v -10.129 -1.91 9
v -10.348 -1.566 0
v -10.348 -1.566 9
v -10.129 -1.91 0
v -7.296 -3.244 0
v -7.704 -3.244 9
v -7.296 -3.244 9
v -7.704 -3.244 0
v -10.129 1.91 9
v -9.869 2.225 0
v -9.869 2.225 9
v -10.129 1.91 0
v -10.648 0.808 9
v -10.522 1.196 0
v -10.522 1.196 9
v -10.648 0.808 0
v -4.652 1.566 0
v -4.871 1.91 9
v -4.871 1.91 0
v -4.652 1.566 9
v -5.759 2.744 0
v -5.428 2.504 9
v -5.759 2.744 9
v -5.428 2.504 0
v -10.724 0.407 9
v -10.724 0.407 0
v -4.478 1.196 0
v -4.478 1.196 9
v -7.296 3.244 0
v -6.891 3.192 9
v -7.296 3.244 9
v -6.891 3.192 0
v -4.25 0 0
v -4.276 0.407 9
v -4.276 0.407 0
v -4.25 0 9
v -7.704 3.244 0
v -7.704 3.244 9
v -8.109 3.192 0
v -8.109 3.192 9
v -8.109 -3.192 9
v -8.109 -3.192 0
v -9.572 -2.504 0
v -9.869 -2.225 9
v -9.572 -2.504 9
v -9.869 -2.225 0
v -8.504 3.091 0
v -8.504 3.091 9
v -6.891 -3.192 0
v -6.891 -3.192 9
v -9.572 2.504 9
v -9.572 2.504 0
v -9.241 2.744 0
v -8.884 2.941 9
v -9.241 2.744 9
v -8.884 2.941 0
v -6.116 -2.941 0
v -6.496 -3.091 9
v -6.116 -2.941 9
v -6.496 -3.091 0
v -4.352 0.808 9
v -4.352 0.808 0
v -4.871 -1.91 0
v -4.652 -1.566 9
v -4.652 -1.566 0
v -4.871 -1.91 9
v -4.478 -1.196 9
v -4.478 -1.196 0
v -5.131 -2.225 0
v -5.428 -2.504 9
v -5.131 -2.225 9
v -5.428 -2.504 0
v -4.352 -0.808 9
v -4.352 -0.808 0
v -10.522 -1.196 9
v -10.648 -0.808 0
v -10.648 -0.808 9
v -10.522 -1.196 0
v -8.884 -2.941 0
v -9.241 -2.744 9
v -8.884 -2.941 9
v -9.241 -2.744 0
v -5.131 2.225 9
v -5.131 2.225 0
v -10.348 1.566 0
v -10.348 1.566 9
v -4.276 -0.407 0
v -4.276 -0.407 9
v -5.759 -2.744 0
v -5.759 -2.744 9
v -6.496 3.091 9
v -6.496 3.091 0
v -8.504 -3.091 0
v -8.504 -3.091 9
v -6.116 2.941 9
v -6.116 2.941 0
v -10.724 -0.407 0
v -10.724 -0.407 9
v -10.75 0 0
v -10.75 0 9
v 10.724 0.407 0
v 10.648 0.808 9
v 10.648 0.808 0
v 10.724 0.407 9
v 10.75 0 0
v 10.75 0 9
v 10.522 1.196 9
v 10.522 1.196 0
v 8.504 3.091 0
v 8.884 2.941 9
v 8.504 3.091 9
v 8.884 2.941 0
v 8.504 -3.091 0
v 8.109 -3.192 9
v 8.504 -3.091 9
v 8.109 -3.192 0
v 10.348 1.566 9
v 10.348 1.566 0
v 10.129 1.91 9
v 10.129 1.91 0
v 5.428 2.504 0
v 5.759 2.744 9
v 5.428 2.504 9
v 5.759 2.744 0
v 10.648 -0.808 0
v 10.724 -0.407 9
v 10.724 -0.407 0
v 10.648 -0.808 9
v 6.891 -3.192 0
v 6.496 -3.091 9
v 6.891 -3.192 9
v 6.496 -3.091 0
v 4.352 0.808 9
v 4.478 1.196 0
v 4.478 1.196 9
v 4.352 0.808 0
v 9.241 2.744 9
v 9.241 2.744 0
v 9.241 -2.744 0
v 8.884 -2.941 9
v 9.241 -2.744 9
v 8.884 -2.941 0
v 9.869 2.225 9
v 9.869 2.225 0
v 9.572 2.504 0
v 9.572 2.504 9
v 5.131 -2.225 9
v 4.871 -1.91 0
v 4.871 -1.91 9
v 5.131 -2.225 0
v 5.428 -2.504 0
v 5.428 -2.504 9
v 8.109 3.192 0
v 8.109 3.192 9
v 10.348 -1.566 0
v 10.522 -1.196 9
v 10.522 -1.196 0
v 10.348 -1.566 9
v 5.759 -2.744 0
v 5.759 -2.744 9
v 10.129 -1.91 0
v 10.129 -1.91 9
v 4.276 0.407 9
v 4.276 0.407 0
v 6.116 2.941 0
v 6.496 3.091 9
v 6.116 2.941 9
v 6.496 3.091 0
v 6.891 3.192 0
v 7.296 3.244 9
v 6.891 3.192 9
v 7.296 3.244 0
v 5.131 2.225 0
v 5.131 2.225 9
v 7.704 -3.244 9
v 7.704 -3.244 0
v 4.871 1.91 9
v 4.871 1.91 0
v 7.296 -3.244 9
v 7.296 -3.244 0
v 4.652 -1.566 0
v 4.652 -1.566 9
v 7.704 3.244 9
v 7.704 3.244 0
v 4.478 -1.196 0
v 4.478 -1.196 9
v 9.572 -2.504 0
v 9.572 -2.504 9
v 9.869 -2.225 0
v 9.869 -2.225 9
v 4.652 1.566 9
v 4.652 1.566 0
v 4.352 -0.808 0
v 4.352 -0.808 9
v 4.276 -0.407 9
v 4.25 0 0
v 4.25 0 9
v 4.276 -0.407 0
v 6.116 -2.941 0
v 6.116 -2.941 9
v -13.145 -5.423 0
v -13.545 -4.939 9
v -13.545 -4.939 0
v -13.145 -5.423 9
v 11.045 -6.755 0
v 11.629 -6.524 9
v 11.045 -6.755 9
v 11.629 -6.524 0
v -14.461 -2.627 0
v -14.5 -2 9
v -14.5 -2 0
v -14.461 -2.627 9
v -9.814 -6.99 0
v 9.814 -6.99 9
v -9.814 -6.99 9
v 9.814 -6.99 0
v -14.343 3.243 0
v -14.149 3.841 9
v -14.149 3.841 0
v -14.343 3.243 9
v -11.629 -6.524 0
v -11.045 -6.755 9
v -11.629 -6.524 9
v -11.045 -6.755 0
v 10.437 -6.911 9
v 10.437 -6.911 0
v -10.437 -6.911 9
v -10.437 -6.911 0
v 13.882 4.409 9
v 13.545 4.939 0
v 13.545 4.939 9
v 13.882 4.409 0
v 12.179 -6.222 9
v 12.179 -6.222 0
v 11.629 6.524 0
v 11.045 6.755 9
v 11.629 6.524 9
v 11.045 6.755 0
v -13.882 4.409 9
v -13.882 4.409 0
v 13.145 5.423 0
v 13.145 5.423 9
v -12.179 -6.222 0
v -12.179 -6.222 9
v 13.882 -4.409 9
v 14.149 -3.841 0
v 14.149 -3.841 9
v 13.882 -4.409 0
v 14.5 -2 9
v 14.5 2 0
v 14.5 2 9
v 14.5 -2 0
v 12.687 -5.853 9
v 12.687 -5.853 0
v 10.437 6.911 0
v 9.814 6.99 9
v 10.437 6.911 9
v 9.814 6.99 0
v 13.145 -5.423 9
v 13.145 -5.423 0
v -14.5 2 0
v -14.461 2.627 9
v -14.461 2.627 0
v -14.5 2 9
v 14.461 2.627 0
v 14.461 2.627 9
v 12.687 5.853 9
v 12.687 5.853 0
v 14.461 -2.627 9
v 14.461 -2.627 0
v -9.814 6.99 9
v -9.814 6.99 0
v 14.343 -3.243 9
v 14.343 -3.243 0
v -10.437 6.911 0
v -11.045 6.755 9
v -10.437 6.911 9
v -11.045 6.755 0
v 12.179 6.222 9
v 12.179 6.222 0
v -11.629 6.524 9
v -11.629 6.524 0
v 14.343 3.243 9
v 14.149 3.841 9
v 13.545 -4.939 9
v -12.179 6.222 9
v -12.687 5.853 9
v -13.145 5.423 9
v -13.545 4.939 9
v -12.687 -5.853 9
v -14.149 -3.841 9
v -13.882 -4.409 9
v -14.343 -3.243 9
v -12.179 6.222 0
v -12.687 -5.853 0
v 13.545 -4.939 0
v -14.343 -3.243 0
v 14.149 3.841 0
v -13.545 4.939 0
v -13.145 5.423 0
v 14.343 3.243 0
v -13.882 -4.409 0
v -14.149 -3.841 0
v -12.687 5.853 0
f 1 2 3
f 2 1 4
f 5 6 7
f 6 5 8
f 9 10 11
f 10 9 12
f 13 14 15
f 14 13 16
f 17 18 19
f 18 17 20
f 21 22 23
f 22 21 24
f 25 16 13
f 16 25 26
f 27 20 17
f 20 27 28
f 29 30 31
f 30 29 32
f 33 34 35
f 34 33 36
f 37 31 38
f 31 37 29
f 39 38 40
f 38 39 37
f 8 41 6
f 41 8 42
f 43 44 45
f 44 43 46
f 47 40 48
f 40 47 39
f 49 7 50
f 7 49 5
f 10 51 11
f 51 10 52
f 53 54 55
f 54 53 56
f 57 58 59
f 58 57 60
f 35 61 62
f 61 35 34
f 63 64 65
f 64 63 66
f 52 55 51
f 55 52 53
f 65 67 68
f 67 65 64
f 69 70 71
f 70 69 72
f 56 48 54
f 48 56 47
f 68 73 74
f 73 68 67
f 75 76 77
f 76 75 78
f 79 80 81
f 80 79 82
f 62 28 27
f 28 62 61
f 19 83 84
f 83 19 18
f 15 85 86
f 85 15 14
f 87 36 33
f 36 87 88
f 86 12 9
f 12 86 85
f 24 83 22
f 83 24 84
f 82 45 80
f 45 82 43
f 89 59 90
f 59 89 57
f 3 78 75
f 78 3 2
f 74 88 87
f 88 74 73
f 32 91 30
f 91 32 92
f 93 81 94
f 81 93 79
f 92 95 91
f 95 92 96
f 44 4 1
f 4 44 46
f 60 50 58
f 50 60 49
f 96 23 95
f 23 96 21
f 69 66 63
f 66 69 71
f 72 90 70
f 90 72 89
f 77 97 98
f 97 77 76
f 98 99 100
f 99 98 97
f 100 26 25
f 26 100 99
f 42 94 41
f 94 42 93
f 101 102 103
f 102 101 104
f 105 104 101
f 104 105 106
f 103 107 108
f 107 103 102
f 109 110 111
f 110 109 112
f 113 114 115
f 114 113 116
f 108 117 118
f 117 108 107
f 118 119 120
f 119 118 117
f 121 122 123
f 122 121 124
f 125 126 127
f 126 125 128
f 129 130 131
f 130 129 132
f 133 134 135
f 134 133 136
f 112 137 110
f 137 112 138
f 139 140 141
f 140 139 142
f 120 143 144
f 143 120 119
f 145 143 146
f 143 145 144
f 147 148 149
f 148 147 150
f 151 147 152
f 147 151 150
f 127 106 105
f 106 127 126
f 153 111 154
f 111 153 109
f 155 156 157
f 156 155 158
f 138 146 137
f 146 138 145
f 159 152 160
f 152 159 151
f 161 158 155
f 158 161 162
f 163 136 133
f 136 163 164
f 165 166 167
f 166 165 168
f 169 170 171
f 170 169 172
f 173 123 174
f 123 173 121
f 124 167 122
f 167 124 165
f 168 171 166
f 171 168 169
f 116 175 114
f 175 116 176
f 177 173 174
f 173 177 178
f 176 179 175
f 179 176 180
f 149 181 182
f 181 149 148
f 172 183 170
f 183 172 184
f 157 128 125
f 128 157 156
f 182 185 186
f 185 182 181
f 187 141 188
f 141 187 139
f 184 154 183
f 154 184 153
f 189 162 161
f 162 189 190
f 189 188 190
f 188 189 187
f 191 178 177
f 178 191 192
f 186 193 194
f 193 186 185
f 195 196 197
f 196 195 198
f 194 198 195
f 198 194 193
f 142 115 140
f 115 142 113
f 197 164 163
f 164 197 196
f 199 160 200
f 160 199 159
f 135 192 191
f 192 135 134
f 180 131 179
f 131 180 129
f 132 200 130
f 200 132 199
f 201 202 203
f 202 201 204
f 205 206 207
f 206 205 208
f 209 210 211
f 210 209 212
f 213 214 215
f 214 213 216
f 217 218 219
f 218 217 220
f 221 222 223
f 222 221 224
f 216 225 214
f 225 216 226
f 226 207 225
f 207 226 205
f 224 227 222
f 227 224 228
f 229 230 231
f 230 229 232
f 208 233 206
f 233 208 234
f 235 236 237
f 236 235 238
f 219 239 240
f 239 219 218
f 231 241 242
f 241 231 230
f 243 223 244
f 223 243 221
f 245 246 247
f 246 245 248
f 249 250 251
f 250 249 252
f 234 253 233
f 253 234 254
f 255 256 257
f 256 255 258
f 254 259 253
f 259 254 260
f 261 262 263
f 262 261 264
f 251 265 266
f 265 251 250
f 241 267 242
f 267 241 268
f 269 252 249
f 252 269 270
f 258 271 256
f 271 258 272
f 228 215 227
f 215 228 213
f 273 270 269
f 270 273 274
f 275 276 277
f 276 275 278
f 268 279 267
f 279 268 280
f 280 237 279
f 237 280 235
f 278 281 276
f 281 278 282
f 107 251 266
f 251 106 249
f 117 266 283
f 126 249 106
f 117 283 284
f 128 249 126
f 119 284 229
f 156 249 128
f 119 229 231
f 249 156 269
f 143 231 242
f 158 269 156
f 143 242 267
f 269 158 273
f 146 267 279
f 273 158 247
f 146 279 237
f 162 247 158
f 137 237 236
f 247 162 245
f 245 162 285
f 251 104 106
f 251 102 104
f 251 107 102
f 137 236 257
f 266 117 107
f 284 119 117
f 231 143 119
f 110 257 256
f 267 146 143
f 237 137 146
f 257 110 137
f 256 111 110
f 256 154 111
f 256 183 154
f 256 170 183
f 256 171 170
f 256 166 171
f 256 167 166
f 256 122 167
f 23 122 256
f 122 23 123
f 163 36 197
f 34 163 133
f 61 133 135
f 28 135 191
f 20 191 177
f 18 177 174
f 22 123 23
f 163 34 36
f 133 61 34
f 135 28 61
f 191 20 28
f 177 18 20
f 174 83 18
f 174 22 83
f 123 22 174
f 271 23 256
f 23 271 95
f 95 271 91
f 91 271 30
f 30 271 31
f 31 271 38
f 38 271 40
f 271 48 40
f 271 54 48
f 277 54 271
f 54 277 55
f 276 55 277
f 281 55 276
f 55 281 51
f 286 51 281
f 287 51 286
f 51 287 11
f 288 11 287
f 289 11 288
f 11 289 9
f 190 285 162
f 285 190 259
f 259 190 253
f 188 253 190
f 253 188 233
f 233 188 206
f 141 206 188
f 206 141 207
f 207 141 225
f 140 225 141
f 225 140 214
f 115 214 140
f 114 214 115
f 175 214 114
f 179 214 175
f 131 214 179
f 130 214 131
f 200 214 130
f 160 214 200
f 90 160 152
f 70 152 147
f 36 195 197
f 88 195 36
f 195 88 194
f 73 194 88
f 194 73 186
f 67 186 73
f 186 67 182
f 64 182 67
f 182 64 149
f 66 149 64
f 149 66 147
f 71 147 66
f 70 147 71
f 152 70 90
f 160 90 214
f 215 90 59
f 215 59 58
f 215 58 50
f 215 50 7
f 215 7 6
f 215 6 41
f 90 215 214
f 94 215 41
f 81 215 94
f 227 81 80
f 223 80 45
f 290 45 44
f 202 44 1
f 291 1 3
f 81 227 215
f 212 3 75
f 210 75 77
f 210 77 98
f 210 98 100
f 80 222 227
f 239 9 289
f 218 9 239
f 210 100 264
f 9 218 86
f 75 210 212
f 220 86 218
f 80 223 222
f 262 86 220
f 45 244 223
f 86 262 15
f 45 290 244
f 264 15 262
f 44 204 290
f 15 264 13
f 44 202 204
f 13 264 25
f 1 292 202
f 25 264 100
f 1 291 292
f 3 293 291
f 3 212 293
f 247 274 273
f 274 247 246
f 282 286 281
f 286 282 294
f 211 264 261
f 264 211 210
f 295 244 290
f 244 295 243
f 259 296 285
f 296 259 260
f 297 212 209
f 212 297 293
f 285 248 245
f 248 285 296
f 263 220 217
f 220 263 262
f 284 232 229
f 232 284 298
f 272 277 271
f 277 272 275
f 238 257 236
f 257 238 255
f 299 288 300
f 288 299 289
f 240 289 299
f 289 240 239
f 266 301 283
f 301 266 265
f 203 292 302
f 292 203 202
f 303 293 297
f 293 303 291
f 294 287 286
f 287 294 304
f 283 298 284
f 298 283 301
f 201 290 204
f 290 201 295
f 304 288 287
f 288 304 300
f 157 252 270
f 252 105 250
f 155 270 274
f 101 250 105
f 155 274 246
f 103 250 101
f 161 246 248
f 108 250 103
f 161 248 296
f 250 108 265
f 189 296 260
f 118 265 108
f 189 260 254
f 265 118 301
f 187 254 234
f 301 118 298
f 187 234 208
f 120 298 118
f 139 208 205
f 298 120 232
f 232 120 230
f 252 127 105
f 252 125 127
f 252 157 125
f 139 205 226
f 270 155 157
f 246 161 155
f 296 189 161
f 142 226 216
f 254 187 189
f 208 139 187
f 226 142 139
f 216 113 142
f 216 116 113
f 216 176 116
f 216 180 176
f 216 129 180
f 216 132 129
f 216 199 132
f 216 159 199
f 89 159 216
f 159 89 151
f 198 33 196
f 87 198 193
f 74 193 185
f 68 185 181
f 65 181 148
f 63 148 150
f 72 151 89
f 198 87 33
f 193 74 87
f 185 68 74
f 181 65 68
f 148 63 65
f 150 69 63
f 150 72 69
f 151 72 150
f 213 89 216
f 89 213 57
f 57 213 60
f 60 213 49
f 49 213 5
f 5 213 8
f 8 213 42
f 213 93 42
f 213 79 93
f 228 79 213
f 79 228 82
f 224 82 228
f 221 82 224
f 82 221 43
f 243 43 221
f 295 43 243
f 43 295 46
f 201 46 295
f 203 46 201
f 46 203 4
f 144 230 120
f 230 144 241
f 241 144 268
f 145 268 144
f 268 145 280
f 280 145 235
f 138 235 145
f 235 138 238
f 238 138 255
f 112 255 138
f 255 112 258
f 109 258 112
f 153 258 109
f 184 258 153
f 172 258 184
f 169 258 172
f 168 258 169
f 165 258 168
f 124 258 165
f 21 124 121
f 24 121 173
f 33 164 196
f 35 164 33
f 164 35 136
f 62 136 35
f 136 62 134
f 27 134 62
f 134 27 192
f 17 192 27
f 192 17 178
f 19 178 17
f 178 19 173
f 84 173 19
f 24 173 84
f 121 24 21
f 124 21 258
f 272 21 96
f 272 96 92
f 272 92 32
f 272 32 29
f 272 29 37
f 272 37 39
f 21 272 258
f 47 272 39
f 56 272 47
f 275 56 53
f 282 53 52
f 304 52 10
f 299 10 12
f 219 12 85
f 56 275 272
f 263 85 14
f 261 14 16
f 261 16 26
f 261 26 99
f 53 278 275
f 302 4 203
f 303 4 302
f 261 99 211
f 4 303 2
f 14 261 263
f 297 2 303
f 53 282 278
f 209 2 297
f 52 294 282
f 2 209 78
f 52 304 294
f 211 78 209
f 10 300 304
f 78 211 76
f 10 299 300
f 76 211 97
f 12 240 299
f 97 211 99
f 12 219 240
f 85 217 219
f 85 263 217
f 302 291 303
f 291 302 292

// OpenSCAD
$fn = 50;


difference() {
	union() {
		hull() {
			translate(v = [-9.5000000000, 2.0000000000, 0]) {
				cylinder(h = 9, r = 5);
			}
			translate(v = [9.5000000000, 2.0000000000, 0]) {
				cylinder(h = 9, r = 5);
			}
			translate(v = [-9.5000000000, -2.0000000000, 0]) {
				cylinder(h = 9, r = 5);
			}
			translate(v = [9.5000000000, -2.0000000000, 0]) {
				cylinder(h = 9, r = 5);
			}
		}
	}
	union() {
		translate(v = [-7.5000000000, 0.0000000000, 0]) {
			translate(v = [0, 0, -100]) {
				cylinder(h = 200, r = 3.2500000000);
			}
		}
		translate(v = [7.5000000000, 0.0000000000, 0]) {
			translate(v = [0, 0, -100]) {
				cylinder(h = 200, r = 3.2500000000);
			}
		}
	}
}
